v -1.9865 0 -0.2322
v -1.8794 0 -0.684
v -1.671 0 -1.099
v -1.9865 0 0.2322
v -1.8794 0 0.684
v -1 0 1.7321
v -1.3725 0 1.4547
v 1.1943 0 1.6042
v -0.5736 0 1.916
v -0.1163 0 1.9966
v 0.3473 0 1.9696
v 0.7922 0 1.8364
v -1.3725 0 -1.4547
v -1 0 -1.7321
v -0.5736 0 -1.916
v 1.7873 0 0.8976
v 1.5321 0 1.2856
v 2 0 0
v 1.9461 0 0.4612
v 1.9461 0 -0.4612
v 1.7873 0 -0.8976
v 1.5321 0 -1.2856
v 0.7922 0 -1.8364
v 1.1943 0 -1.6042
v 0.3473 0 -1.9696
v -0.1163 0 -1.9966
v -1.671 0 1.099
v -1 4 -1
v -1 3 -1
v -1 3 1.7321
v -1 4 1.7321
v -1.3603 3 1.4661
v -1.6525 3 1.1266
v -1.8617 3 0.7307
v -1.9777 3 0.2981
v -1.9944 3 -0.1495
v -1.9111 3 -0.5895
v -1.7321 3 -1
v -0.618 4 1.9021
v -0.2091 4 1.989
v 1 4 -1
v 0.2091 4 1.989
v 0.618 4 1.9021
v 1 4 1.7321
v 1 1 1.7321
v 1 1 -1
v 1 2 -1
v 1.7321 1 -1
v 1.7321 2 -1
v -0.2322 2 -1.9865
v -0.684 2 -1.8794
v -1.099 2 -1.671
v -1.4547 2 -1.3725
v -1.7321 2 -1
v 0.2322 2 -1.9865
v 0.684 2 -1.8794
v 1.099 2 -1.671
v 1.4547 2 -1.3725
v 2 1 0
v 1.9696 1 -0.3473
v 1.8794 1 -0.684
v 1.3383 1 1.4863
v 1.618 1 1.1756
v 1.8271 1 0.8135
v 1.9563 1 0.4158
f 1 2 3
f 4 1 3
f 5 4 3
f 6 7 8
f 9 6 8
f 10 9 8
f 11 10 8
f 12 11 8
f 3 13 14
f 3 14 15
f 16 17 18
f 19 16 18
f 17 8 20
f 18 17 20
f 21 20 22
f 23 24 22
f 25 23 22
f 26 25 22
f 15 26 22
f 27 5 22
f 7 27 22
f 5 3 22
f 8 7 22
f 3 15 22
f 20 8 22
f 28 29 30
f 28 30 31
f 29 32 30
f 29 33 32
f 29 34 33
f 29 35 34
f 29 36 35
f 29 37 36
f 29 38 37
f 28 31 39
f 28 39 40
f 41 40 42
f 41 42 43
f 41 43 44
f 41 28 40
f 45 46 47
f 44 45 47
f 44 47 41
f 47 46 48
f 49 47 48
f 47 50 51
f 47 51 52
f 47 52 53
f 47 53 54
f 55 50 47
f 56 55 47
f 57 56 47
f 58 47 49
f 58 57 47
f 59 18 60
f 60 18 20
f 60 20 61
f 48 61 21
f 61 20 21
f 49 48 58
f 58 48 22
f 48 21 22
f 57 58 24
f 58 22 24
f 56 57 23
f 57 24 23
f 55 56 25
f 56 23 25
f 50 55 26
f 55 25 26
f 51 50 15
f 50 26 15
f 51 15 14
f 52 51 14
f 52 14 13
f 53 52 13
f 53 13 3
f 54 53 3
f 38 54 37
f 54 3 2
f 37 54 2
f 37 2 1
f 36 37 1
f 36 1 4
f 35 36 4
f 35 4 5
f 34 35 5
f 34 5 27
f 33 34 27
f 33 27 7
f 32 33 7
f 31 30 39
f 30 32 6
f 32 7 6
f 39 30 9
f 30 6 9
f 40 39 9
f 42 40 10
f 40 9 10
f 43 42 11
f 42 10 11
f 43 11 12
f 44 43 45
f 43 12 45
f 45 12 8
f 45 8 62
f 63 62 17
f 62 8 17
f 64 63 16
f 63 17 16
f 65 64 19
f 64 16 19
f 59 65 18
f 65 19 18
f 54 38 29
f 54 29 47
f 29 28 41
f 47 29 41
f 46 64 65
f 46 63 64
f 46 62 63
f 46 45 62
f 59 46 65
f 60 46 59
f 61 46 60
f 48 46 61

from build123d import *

# Parameters (mm, degrees)
SKETCH1_R               = 2
BOSS_EXTRUDE1_DEPTH     = 4
SKETCH2_W               = 1
SKETCH2_H               = 3
SKETCH2_H_2             = 1
CUT_EXTRUDE1_DEPTH      = 3
CUT_EXTRUDE1_DEPTH_BACK = 1
CUT_EXTRUDE2_DEPTH      = 2


with BuildPart() as part:
    # Sketch1 → Boss-Extrude1 (new body)
    with BuildSketch(Plane(origin=(0, 0, 0), x_dir=(1, 0, 0), z_dir=(0, 1, 0))):
        Circle(SKETCH1_R)
    extrude(amount=BOSS_EXTRUDE1_DEPTH)

    # Sketch2 → Cut-Extrude1 (cut, two sides)
    with BuildSketch(Plane.XY) as cut_extrude1_sk:
        with Locations((1.5, 2.5)):
            Rectangle(SKETCH2_W, SKETCH2_H)
        with Locations((-1.5, 3.5)):
            Rectangle(SKETCH2_W, SKETCH2_H_2)
    extrude(amount=CUT_EXTRUDE1_DEPTH, mode=Mode.SUBTRACT)
    extrude(cut_extrude1_sk.sketch, amount=-CUT_EXTRUDE1_DEPTH_BACK, mode=Mode.SUBTRACT)

    # Sketch3 → Cut-Extrude2 (cut)
    with BuildSketch(Plane(origin=(0, 4, 0), x_dir=(1, 0, 0), z_dir=(0, 1, 0))):
        with BuildLine():
            Line((-1.732050808, 1), (1.732050808, 1))
            ThreePointArc((1.732050808, 1), (0, 2), (-1.732050808, 1))
        make_face()
    extrude(amount=-CUT_EXTRUDE2_DEPTH, mode=Mode.SUBTRACT)


solid = part.part
